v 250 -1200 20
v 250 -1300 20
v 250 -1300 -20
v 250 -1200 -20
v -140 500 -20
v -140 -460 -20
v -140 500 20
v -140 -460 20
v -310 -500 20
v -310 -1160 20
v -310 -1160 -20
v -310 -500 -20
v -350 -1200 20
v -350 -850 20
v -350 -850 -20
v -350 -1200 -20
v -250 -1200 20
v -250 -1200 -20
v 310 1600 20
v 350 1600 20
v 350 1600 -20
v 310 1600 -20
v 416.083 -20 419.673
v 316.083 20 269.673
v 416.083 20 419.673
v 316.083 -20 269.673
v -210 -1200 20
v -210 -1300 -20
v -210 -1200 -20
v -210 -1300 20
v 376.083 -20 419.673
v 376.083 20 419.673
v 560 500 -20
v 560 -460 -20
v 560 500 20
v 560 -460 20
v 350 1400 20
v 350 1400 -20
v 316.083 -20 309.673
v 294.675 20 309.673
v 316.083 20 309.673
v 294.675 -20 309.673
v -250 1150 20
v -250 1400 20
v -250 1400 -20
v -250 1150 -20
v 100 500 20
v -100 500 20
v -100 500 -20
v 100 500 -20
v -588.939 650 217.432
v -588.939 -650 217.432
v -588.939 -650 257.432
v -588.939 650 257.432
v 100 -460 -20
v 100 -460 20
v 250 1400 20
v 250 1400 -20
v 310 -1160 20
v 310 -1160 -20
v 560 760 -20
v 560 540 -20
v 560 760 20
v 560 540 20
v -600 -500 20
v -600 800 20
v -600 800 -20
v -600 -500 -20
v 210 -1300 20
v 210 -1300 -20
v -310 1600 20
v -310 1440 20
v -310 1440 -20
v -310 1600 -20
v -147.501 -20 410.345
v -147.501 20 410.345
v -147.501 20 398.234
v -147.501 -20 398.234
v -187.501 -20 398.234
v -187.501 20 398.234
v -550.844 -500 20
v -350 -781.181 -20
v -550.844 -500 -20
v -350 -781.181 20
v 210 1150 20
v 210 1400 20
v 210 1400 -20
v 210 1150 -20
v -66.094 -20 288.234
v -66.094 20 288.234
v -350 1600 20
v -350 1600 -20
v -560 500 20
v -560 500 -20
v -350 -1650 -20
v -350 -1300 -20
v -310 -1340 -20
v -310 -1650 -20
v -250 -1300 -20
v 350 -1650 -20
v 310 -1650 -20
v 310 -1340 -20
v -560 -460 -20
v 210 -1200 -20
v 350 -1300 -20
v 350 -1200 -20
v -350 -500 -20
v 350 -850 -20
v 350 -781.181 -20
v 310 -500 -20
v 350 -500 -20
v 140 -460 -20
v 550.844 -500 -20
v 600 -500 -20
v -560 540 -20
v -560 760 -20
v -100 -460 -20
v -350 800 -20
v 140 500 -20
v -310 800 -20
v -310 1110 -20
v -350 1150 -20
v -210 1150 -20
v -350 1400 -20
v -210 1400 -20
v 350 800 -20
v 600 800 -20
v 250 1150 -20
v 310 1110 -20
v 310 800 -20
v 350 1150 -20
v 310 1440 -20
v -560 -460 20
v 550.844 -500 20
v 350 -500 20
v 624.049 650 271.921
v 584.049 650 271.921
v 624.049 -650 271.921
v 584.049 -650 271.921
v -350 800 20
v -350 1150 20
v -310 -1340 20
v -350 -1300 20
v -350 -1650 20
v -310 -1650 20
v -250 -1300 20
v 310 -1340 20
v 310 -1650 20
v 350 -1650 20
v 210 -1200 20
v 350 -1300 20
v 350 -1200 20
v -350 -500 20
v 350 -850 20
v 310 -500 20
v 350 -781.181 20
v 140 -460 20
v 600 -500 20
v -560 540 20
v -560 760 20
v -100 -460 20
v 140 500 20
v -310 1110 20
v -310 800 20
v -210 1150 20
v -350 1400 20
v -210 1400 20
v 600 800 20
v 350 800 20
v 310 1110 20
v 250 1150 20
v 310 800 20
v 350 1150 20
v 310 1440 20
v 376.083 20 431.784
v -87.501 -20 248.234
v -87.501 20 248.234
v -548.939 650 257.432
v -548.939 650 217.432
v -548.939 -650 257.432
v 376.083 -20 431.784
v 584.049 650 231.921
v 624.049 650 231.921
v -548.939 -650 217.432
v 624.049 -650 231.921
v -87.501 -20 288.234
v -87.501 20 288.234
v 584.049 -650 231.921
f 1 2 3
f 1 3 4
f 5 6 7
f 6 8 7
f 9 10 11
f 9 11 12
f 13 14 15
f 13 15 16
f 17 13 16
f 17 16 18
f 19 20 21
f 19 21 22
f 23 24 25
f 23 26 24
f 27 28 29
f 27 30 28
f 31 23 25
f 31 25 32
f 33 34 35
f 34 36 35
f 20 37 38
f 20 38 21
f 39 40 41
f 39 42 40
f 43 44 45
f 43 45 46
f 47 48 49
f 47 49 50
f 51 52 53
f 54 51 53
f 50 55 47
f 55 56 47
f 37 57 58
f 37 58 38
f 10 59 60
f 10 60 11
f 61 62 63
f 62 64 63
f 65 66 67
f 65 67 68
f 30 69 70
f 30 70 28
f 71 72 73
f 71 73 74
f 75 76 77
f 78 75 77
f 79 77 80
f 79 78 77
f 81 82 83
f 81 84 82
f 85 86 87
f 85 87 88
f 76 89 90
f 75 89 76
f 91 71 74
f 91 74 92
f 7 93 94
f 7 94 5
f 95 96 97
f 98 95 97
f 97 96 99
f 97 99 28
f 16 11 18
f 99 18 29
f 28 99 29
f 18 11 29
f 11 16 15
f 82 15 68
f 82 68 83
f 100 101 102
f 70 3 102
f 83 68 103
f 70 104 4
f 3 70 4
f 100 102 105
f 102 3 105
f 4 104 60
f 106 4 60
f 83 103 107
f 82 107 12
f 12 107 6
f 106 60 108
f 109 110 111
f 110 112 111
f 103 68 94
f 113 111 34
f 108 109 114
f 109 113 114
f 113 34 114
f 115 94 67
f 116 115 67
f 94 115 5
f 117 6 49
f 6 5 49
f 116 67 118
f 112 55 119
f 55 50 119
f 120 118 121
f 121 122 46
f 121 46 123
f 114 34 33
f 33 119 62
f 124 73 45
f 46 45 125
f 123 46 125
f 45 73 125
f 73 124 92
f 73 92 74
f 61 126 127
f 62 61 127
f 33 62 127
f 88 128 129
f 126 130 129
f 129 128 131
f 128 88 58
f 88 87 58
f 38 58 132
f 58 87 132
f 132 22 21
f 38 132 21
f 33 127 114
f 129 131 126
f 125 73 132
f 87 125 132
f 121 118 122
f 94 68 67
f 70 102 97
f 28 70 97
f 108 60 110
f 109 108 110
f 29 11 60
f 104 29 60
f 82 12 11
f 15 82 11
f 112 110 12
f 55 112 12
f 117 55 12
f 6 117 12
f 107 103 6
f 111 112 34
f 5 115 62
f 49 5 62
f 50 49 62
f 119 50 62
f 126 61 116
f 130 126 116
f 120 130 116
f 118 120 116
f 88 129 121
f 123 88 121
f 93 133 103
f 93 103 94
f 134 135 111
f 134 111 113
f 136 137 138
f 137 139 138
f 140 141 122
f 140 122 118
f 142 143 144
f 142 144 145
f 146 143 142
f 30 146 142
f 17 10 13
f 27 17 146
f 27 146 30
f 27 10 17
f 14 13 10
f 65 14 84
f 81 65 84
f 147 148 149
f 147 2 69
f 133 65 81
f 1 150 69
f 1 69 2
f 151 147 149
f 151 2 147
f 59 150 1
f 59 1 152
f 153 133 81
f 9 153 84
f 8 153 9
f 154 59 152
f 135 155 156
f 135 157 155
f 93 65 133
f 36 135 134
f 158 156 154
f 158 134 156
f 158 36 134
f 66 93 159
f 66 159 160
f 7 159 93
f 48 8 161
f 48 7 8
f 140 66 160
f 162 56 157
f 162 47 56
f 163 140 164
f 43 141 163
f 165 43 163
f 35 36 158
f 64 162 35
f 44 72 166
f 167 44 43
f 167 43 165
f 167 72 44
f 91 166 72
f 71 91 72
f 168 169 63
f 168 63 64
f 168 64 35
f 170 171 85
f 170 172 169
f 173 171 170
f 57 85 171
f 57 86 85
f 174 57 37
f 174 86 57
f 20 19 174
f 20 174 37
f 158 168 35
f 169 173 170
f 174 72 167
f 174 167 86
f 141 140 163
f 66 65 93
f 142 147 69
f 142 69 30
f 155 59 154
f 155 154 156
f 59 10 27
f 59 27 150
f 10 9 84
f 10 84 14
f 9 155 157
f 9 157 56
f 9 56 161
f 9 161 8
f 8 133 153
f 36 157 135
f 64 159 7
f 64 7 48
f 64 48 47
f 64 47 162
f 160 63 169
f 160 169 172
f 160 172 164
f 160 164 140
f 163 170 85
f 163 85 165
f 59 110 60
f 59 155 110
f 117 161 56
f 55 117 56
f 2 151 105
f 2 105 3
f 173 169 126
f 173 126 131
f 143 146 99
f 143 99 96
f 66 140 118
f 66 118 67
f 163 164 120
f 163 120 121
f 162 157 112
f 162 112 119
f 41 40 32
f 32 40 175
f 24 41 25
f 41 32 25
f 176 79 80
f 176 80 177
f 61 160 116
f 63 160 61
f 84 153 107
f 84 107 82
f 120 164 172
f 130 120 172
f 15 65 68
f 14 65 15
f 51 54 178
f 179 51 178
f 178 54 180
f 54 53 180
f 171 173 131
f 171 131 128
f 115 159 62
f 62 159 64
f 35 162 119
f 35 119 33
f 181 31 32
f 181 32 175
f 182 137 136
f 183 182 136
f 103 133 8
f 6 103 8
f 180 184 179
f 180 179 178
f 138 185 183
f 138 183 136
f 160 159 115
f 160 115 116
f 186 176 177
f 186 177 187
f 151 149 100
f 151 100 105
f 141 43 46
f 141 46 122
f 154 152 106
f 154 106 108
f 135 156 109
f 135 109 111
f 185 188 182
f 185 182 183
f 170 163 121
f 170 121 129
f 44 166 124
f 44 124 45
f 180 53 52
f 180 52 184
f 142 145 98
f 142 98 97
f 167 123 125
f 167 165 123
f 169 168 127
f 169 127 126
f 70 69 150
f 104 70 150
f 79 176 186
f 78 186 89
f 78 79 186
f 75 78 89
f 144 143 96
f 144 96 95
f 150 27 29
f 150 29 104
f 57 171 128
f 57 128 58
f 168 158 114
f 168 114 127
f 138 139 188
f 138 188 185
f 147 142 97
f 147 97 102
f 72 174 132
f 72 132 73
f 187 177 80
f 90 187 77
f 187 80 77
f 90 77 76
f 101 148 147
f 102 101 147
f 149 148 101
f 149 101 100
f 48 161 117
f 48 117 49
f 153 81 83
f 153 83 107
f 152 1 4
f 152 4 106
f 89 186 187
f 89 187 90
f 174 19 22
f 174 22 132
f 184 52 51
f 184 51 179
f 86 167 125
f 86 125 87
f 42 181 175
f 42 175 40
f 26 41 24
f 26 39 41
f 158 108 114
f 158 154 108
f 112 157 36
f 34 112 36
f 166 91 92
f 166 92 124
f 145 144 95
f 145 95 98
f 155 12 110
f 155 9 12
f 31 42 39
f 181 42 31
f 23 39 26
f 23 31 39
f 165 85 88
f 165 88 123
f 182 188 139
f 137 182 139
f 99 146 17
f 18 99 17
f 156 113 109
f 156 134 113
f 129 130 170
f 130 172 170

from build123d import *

# Parameters (mm, degrees)
F0_W     = 420
F0_H     = 960
F0_W_2   = 200
F0_W_3   = 1120
F0_H_2   = 220
F0_W_4   = 620
F0_H_3   = 310
F0_W_5   = 40
F0_H_4   = 100
F0_H_5   = 40
F1_DEPTH = 20
F2_W     = 40
F2_H     = 40
F3_DEPTH = 650
F4_W     = 40
F4_H     = 40
F5_DEPTH = 650
F7_DEPTH = 20
F9_DEPTH = 20


with BuildPart() as f1:
    # F0 (on Top) → F1 (new body, symmetric)
    with BuildSketch(Plane.XY):
        Polygon((0, -500), (100, -500), (310, -500), (310, -850), (350, -850), (600, -500), (600, 500), (600, 800), (350, 800), (350, 1150), (310, 1150), (250, 1150), (250, 1400), (310, 1400), (350, 1400), (350, 1600), (310, 1600), (310, 1440), (-310, 1440), (-310, 1600), (-350, 1600), (-350, 1400), (-310, 1400), (-250, 1400), (-250, 1150), (-310, 1150), (-350, 1150), (-350, 800), (-600, 800), (-600, 500), (-600, -500), (-350, -850), (-310, -850), (-310, -500), (-100, -500), align=None)
        Polygon((-550.843856, -500), (-350, -500), (-350, -781.181398), align=None, mode=Mode.SUBTRACT)
        Polygon((350, -781.181398), (350, -500), (550.843856, -500), align=None, mode=Mode.SUBTRACT)
        with Locations((-350, 20)):
            Rectangle(F0_W, F0_H, mode=Mode.SUBTRACT)
        with Locations((0, 20)):
            Rectangle(F0_W_2, F0_H, mode=Mode.SUBTRACT)
        with Locations((0, 650)):
            Rectangle(F0_W_3, F0_H_2, mode=Mode.SUBTRACT)
        with Locations((350, 20)):
            Rectangle(F0_W, F0_H, mode=Mode.SUBTRACT)
        with Locations((0, 955)):
            Rectangle(F0_W_4, F0_H_3, mode=Mode.SUBTRACT)
        Polygon((-210, 1400), (0, 1400), (210, 1400), (210, 1150), (0, 1150), (-210, 1150), align=None, mode=Mode.SUBTRACT)
        Polygon((350, -850), (310, -850), (310, -1160), (0, -1160), (-310, -1160), (-310, -850), (-350, -850), (-350, -1200), (-250, -1200), (-210, -1200), (0, -1200), (210, -1200), (250, -1200), (350, -1200), align=None)
        with Locations((230, -1250)):
            Rectangle(F0_W_5, F0_H_4)
        with Locations((-230, -1250)):
            Rectangle(F0_W_5, F0_H_4)
        Polygon((310, -1300), (250, -1300), (210, -1300), (0, -1300), (-210, -1300), (-250, -1300), (-310, -1300), (-310, -1340), (0, -1340), (310, -1340), align=None)
        with Locations((330, -1495)):
            Rectangle(F0_W_5, F0_H_3)
        with Locations((-330, -1495)):
            Rectangle(F0_W_5, F0_H_3)
        with Locations((-330, -1320)):
            Rectangle(F0_W_5, F0_H_5)
        with Locations((330, -1320)):
            Rectangle(F0_W_5, F0_H_5)
    extrude(amount=F1_DEPTH, both=True)


with BuildPart() as f3:
    # F2 (on Front) → F3 (new body, symmetric)
    with BuildSketch(Plane.XZ):
        with Locations((-568.938563, 237.431973)):
            Rectangle(F2_W, F2_H)
    extrude(amount=F3_DEPTH, both=True)


with BuildPart() as f5:
    # F4 (on Front) → F5 (new body, symmetric)
    with BuildSketch(Plane.XZ):
        with Locations((604.049072, 251.920938)):
            Rectangle(F4_W, F4_H)
    extrude(amount=F5_DEPTH, both=True)


with BuildPart() as f7:
    # F6 (on Front) → F7 (new body, symmetric)
    with BuildSketch(Plane.XZ):
        Polygon((316.082844, 269.67296), (416.082844, 419.67296), (376.082844, 419.67296), (376.082844, 431.783986), (294.675493, 309.67296), (316.082844, 309.67296), align=None)
    extrude(amount=F7_DEPTH, both=True)


with BuildPart() as f9:
    # F8 (on Front) → F9 (new body, symmetric)
    with BuildSketch(Plane.XZ):
        Polygon((-147.501485, 398.234331), (-187.501485, 398.234331), (-87.501485, 248.234331), (-87.501485, 288.234331), (-66.094134, 288.234331), (-147.501485, 410.345357), align=None)
    extrude(amount=F9_DEPTH, both=True)


solid = Compound([f1.part, f3.part, f5.part, f7.part, f9.part])
